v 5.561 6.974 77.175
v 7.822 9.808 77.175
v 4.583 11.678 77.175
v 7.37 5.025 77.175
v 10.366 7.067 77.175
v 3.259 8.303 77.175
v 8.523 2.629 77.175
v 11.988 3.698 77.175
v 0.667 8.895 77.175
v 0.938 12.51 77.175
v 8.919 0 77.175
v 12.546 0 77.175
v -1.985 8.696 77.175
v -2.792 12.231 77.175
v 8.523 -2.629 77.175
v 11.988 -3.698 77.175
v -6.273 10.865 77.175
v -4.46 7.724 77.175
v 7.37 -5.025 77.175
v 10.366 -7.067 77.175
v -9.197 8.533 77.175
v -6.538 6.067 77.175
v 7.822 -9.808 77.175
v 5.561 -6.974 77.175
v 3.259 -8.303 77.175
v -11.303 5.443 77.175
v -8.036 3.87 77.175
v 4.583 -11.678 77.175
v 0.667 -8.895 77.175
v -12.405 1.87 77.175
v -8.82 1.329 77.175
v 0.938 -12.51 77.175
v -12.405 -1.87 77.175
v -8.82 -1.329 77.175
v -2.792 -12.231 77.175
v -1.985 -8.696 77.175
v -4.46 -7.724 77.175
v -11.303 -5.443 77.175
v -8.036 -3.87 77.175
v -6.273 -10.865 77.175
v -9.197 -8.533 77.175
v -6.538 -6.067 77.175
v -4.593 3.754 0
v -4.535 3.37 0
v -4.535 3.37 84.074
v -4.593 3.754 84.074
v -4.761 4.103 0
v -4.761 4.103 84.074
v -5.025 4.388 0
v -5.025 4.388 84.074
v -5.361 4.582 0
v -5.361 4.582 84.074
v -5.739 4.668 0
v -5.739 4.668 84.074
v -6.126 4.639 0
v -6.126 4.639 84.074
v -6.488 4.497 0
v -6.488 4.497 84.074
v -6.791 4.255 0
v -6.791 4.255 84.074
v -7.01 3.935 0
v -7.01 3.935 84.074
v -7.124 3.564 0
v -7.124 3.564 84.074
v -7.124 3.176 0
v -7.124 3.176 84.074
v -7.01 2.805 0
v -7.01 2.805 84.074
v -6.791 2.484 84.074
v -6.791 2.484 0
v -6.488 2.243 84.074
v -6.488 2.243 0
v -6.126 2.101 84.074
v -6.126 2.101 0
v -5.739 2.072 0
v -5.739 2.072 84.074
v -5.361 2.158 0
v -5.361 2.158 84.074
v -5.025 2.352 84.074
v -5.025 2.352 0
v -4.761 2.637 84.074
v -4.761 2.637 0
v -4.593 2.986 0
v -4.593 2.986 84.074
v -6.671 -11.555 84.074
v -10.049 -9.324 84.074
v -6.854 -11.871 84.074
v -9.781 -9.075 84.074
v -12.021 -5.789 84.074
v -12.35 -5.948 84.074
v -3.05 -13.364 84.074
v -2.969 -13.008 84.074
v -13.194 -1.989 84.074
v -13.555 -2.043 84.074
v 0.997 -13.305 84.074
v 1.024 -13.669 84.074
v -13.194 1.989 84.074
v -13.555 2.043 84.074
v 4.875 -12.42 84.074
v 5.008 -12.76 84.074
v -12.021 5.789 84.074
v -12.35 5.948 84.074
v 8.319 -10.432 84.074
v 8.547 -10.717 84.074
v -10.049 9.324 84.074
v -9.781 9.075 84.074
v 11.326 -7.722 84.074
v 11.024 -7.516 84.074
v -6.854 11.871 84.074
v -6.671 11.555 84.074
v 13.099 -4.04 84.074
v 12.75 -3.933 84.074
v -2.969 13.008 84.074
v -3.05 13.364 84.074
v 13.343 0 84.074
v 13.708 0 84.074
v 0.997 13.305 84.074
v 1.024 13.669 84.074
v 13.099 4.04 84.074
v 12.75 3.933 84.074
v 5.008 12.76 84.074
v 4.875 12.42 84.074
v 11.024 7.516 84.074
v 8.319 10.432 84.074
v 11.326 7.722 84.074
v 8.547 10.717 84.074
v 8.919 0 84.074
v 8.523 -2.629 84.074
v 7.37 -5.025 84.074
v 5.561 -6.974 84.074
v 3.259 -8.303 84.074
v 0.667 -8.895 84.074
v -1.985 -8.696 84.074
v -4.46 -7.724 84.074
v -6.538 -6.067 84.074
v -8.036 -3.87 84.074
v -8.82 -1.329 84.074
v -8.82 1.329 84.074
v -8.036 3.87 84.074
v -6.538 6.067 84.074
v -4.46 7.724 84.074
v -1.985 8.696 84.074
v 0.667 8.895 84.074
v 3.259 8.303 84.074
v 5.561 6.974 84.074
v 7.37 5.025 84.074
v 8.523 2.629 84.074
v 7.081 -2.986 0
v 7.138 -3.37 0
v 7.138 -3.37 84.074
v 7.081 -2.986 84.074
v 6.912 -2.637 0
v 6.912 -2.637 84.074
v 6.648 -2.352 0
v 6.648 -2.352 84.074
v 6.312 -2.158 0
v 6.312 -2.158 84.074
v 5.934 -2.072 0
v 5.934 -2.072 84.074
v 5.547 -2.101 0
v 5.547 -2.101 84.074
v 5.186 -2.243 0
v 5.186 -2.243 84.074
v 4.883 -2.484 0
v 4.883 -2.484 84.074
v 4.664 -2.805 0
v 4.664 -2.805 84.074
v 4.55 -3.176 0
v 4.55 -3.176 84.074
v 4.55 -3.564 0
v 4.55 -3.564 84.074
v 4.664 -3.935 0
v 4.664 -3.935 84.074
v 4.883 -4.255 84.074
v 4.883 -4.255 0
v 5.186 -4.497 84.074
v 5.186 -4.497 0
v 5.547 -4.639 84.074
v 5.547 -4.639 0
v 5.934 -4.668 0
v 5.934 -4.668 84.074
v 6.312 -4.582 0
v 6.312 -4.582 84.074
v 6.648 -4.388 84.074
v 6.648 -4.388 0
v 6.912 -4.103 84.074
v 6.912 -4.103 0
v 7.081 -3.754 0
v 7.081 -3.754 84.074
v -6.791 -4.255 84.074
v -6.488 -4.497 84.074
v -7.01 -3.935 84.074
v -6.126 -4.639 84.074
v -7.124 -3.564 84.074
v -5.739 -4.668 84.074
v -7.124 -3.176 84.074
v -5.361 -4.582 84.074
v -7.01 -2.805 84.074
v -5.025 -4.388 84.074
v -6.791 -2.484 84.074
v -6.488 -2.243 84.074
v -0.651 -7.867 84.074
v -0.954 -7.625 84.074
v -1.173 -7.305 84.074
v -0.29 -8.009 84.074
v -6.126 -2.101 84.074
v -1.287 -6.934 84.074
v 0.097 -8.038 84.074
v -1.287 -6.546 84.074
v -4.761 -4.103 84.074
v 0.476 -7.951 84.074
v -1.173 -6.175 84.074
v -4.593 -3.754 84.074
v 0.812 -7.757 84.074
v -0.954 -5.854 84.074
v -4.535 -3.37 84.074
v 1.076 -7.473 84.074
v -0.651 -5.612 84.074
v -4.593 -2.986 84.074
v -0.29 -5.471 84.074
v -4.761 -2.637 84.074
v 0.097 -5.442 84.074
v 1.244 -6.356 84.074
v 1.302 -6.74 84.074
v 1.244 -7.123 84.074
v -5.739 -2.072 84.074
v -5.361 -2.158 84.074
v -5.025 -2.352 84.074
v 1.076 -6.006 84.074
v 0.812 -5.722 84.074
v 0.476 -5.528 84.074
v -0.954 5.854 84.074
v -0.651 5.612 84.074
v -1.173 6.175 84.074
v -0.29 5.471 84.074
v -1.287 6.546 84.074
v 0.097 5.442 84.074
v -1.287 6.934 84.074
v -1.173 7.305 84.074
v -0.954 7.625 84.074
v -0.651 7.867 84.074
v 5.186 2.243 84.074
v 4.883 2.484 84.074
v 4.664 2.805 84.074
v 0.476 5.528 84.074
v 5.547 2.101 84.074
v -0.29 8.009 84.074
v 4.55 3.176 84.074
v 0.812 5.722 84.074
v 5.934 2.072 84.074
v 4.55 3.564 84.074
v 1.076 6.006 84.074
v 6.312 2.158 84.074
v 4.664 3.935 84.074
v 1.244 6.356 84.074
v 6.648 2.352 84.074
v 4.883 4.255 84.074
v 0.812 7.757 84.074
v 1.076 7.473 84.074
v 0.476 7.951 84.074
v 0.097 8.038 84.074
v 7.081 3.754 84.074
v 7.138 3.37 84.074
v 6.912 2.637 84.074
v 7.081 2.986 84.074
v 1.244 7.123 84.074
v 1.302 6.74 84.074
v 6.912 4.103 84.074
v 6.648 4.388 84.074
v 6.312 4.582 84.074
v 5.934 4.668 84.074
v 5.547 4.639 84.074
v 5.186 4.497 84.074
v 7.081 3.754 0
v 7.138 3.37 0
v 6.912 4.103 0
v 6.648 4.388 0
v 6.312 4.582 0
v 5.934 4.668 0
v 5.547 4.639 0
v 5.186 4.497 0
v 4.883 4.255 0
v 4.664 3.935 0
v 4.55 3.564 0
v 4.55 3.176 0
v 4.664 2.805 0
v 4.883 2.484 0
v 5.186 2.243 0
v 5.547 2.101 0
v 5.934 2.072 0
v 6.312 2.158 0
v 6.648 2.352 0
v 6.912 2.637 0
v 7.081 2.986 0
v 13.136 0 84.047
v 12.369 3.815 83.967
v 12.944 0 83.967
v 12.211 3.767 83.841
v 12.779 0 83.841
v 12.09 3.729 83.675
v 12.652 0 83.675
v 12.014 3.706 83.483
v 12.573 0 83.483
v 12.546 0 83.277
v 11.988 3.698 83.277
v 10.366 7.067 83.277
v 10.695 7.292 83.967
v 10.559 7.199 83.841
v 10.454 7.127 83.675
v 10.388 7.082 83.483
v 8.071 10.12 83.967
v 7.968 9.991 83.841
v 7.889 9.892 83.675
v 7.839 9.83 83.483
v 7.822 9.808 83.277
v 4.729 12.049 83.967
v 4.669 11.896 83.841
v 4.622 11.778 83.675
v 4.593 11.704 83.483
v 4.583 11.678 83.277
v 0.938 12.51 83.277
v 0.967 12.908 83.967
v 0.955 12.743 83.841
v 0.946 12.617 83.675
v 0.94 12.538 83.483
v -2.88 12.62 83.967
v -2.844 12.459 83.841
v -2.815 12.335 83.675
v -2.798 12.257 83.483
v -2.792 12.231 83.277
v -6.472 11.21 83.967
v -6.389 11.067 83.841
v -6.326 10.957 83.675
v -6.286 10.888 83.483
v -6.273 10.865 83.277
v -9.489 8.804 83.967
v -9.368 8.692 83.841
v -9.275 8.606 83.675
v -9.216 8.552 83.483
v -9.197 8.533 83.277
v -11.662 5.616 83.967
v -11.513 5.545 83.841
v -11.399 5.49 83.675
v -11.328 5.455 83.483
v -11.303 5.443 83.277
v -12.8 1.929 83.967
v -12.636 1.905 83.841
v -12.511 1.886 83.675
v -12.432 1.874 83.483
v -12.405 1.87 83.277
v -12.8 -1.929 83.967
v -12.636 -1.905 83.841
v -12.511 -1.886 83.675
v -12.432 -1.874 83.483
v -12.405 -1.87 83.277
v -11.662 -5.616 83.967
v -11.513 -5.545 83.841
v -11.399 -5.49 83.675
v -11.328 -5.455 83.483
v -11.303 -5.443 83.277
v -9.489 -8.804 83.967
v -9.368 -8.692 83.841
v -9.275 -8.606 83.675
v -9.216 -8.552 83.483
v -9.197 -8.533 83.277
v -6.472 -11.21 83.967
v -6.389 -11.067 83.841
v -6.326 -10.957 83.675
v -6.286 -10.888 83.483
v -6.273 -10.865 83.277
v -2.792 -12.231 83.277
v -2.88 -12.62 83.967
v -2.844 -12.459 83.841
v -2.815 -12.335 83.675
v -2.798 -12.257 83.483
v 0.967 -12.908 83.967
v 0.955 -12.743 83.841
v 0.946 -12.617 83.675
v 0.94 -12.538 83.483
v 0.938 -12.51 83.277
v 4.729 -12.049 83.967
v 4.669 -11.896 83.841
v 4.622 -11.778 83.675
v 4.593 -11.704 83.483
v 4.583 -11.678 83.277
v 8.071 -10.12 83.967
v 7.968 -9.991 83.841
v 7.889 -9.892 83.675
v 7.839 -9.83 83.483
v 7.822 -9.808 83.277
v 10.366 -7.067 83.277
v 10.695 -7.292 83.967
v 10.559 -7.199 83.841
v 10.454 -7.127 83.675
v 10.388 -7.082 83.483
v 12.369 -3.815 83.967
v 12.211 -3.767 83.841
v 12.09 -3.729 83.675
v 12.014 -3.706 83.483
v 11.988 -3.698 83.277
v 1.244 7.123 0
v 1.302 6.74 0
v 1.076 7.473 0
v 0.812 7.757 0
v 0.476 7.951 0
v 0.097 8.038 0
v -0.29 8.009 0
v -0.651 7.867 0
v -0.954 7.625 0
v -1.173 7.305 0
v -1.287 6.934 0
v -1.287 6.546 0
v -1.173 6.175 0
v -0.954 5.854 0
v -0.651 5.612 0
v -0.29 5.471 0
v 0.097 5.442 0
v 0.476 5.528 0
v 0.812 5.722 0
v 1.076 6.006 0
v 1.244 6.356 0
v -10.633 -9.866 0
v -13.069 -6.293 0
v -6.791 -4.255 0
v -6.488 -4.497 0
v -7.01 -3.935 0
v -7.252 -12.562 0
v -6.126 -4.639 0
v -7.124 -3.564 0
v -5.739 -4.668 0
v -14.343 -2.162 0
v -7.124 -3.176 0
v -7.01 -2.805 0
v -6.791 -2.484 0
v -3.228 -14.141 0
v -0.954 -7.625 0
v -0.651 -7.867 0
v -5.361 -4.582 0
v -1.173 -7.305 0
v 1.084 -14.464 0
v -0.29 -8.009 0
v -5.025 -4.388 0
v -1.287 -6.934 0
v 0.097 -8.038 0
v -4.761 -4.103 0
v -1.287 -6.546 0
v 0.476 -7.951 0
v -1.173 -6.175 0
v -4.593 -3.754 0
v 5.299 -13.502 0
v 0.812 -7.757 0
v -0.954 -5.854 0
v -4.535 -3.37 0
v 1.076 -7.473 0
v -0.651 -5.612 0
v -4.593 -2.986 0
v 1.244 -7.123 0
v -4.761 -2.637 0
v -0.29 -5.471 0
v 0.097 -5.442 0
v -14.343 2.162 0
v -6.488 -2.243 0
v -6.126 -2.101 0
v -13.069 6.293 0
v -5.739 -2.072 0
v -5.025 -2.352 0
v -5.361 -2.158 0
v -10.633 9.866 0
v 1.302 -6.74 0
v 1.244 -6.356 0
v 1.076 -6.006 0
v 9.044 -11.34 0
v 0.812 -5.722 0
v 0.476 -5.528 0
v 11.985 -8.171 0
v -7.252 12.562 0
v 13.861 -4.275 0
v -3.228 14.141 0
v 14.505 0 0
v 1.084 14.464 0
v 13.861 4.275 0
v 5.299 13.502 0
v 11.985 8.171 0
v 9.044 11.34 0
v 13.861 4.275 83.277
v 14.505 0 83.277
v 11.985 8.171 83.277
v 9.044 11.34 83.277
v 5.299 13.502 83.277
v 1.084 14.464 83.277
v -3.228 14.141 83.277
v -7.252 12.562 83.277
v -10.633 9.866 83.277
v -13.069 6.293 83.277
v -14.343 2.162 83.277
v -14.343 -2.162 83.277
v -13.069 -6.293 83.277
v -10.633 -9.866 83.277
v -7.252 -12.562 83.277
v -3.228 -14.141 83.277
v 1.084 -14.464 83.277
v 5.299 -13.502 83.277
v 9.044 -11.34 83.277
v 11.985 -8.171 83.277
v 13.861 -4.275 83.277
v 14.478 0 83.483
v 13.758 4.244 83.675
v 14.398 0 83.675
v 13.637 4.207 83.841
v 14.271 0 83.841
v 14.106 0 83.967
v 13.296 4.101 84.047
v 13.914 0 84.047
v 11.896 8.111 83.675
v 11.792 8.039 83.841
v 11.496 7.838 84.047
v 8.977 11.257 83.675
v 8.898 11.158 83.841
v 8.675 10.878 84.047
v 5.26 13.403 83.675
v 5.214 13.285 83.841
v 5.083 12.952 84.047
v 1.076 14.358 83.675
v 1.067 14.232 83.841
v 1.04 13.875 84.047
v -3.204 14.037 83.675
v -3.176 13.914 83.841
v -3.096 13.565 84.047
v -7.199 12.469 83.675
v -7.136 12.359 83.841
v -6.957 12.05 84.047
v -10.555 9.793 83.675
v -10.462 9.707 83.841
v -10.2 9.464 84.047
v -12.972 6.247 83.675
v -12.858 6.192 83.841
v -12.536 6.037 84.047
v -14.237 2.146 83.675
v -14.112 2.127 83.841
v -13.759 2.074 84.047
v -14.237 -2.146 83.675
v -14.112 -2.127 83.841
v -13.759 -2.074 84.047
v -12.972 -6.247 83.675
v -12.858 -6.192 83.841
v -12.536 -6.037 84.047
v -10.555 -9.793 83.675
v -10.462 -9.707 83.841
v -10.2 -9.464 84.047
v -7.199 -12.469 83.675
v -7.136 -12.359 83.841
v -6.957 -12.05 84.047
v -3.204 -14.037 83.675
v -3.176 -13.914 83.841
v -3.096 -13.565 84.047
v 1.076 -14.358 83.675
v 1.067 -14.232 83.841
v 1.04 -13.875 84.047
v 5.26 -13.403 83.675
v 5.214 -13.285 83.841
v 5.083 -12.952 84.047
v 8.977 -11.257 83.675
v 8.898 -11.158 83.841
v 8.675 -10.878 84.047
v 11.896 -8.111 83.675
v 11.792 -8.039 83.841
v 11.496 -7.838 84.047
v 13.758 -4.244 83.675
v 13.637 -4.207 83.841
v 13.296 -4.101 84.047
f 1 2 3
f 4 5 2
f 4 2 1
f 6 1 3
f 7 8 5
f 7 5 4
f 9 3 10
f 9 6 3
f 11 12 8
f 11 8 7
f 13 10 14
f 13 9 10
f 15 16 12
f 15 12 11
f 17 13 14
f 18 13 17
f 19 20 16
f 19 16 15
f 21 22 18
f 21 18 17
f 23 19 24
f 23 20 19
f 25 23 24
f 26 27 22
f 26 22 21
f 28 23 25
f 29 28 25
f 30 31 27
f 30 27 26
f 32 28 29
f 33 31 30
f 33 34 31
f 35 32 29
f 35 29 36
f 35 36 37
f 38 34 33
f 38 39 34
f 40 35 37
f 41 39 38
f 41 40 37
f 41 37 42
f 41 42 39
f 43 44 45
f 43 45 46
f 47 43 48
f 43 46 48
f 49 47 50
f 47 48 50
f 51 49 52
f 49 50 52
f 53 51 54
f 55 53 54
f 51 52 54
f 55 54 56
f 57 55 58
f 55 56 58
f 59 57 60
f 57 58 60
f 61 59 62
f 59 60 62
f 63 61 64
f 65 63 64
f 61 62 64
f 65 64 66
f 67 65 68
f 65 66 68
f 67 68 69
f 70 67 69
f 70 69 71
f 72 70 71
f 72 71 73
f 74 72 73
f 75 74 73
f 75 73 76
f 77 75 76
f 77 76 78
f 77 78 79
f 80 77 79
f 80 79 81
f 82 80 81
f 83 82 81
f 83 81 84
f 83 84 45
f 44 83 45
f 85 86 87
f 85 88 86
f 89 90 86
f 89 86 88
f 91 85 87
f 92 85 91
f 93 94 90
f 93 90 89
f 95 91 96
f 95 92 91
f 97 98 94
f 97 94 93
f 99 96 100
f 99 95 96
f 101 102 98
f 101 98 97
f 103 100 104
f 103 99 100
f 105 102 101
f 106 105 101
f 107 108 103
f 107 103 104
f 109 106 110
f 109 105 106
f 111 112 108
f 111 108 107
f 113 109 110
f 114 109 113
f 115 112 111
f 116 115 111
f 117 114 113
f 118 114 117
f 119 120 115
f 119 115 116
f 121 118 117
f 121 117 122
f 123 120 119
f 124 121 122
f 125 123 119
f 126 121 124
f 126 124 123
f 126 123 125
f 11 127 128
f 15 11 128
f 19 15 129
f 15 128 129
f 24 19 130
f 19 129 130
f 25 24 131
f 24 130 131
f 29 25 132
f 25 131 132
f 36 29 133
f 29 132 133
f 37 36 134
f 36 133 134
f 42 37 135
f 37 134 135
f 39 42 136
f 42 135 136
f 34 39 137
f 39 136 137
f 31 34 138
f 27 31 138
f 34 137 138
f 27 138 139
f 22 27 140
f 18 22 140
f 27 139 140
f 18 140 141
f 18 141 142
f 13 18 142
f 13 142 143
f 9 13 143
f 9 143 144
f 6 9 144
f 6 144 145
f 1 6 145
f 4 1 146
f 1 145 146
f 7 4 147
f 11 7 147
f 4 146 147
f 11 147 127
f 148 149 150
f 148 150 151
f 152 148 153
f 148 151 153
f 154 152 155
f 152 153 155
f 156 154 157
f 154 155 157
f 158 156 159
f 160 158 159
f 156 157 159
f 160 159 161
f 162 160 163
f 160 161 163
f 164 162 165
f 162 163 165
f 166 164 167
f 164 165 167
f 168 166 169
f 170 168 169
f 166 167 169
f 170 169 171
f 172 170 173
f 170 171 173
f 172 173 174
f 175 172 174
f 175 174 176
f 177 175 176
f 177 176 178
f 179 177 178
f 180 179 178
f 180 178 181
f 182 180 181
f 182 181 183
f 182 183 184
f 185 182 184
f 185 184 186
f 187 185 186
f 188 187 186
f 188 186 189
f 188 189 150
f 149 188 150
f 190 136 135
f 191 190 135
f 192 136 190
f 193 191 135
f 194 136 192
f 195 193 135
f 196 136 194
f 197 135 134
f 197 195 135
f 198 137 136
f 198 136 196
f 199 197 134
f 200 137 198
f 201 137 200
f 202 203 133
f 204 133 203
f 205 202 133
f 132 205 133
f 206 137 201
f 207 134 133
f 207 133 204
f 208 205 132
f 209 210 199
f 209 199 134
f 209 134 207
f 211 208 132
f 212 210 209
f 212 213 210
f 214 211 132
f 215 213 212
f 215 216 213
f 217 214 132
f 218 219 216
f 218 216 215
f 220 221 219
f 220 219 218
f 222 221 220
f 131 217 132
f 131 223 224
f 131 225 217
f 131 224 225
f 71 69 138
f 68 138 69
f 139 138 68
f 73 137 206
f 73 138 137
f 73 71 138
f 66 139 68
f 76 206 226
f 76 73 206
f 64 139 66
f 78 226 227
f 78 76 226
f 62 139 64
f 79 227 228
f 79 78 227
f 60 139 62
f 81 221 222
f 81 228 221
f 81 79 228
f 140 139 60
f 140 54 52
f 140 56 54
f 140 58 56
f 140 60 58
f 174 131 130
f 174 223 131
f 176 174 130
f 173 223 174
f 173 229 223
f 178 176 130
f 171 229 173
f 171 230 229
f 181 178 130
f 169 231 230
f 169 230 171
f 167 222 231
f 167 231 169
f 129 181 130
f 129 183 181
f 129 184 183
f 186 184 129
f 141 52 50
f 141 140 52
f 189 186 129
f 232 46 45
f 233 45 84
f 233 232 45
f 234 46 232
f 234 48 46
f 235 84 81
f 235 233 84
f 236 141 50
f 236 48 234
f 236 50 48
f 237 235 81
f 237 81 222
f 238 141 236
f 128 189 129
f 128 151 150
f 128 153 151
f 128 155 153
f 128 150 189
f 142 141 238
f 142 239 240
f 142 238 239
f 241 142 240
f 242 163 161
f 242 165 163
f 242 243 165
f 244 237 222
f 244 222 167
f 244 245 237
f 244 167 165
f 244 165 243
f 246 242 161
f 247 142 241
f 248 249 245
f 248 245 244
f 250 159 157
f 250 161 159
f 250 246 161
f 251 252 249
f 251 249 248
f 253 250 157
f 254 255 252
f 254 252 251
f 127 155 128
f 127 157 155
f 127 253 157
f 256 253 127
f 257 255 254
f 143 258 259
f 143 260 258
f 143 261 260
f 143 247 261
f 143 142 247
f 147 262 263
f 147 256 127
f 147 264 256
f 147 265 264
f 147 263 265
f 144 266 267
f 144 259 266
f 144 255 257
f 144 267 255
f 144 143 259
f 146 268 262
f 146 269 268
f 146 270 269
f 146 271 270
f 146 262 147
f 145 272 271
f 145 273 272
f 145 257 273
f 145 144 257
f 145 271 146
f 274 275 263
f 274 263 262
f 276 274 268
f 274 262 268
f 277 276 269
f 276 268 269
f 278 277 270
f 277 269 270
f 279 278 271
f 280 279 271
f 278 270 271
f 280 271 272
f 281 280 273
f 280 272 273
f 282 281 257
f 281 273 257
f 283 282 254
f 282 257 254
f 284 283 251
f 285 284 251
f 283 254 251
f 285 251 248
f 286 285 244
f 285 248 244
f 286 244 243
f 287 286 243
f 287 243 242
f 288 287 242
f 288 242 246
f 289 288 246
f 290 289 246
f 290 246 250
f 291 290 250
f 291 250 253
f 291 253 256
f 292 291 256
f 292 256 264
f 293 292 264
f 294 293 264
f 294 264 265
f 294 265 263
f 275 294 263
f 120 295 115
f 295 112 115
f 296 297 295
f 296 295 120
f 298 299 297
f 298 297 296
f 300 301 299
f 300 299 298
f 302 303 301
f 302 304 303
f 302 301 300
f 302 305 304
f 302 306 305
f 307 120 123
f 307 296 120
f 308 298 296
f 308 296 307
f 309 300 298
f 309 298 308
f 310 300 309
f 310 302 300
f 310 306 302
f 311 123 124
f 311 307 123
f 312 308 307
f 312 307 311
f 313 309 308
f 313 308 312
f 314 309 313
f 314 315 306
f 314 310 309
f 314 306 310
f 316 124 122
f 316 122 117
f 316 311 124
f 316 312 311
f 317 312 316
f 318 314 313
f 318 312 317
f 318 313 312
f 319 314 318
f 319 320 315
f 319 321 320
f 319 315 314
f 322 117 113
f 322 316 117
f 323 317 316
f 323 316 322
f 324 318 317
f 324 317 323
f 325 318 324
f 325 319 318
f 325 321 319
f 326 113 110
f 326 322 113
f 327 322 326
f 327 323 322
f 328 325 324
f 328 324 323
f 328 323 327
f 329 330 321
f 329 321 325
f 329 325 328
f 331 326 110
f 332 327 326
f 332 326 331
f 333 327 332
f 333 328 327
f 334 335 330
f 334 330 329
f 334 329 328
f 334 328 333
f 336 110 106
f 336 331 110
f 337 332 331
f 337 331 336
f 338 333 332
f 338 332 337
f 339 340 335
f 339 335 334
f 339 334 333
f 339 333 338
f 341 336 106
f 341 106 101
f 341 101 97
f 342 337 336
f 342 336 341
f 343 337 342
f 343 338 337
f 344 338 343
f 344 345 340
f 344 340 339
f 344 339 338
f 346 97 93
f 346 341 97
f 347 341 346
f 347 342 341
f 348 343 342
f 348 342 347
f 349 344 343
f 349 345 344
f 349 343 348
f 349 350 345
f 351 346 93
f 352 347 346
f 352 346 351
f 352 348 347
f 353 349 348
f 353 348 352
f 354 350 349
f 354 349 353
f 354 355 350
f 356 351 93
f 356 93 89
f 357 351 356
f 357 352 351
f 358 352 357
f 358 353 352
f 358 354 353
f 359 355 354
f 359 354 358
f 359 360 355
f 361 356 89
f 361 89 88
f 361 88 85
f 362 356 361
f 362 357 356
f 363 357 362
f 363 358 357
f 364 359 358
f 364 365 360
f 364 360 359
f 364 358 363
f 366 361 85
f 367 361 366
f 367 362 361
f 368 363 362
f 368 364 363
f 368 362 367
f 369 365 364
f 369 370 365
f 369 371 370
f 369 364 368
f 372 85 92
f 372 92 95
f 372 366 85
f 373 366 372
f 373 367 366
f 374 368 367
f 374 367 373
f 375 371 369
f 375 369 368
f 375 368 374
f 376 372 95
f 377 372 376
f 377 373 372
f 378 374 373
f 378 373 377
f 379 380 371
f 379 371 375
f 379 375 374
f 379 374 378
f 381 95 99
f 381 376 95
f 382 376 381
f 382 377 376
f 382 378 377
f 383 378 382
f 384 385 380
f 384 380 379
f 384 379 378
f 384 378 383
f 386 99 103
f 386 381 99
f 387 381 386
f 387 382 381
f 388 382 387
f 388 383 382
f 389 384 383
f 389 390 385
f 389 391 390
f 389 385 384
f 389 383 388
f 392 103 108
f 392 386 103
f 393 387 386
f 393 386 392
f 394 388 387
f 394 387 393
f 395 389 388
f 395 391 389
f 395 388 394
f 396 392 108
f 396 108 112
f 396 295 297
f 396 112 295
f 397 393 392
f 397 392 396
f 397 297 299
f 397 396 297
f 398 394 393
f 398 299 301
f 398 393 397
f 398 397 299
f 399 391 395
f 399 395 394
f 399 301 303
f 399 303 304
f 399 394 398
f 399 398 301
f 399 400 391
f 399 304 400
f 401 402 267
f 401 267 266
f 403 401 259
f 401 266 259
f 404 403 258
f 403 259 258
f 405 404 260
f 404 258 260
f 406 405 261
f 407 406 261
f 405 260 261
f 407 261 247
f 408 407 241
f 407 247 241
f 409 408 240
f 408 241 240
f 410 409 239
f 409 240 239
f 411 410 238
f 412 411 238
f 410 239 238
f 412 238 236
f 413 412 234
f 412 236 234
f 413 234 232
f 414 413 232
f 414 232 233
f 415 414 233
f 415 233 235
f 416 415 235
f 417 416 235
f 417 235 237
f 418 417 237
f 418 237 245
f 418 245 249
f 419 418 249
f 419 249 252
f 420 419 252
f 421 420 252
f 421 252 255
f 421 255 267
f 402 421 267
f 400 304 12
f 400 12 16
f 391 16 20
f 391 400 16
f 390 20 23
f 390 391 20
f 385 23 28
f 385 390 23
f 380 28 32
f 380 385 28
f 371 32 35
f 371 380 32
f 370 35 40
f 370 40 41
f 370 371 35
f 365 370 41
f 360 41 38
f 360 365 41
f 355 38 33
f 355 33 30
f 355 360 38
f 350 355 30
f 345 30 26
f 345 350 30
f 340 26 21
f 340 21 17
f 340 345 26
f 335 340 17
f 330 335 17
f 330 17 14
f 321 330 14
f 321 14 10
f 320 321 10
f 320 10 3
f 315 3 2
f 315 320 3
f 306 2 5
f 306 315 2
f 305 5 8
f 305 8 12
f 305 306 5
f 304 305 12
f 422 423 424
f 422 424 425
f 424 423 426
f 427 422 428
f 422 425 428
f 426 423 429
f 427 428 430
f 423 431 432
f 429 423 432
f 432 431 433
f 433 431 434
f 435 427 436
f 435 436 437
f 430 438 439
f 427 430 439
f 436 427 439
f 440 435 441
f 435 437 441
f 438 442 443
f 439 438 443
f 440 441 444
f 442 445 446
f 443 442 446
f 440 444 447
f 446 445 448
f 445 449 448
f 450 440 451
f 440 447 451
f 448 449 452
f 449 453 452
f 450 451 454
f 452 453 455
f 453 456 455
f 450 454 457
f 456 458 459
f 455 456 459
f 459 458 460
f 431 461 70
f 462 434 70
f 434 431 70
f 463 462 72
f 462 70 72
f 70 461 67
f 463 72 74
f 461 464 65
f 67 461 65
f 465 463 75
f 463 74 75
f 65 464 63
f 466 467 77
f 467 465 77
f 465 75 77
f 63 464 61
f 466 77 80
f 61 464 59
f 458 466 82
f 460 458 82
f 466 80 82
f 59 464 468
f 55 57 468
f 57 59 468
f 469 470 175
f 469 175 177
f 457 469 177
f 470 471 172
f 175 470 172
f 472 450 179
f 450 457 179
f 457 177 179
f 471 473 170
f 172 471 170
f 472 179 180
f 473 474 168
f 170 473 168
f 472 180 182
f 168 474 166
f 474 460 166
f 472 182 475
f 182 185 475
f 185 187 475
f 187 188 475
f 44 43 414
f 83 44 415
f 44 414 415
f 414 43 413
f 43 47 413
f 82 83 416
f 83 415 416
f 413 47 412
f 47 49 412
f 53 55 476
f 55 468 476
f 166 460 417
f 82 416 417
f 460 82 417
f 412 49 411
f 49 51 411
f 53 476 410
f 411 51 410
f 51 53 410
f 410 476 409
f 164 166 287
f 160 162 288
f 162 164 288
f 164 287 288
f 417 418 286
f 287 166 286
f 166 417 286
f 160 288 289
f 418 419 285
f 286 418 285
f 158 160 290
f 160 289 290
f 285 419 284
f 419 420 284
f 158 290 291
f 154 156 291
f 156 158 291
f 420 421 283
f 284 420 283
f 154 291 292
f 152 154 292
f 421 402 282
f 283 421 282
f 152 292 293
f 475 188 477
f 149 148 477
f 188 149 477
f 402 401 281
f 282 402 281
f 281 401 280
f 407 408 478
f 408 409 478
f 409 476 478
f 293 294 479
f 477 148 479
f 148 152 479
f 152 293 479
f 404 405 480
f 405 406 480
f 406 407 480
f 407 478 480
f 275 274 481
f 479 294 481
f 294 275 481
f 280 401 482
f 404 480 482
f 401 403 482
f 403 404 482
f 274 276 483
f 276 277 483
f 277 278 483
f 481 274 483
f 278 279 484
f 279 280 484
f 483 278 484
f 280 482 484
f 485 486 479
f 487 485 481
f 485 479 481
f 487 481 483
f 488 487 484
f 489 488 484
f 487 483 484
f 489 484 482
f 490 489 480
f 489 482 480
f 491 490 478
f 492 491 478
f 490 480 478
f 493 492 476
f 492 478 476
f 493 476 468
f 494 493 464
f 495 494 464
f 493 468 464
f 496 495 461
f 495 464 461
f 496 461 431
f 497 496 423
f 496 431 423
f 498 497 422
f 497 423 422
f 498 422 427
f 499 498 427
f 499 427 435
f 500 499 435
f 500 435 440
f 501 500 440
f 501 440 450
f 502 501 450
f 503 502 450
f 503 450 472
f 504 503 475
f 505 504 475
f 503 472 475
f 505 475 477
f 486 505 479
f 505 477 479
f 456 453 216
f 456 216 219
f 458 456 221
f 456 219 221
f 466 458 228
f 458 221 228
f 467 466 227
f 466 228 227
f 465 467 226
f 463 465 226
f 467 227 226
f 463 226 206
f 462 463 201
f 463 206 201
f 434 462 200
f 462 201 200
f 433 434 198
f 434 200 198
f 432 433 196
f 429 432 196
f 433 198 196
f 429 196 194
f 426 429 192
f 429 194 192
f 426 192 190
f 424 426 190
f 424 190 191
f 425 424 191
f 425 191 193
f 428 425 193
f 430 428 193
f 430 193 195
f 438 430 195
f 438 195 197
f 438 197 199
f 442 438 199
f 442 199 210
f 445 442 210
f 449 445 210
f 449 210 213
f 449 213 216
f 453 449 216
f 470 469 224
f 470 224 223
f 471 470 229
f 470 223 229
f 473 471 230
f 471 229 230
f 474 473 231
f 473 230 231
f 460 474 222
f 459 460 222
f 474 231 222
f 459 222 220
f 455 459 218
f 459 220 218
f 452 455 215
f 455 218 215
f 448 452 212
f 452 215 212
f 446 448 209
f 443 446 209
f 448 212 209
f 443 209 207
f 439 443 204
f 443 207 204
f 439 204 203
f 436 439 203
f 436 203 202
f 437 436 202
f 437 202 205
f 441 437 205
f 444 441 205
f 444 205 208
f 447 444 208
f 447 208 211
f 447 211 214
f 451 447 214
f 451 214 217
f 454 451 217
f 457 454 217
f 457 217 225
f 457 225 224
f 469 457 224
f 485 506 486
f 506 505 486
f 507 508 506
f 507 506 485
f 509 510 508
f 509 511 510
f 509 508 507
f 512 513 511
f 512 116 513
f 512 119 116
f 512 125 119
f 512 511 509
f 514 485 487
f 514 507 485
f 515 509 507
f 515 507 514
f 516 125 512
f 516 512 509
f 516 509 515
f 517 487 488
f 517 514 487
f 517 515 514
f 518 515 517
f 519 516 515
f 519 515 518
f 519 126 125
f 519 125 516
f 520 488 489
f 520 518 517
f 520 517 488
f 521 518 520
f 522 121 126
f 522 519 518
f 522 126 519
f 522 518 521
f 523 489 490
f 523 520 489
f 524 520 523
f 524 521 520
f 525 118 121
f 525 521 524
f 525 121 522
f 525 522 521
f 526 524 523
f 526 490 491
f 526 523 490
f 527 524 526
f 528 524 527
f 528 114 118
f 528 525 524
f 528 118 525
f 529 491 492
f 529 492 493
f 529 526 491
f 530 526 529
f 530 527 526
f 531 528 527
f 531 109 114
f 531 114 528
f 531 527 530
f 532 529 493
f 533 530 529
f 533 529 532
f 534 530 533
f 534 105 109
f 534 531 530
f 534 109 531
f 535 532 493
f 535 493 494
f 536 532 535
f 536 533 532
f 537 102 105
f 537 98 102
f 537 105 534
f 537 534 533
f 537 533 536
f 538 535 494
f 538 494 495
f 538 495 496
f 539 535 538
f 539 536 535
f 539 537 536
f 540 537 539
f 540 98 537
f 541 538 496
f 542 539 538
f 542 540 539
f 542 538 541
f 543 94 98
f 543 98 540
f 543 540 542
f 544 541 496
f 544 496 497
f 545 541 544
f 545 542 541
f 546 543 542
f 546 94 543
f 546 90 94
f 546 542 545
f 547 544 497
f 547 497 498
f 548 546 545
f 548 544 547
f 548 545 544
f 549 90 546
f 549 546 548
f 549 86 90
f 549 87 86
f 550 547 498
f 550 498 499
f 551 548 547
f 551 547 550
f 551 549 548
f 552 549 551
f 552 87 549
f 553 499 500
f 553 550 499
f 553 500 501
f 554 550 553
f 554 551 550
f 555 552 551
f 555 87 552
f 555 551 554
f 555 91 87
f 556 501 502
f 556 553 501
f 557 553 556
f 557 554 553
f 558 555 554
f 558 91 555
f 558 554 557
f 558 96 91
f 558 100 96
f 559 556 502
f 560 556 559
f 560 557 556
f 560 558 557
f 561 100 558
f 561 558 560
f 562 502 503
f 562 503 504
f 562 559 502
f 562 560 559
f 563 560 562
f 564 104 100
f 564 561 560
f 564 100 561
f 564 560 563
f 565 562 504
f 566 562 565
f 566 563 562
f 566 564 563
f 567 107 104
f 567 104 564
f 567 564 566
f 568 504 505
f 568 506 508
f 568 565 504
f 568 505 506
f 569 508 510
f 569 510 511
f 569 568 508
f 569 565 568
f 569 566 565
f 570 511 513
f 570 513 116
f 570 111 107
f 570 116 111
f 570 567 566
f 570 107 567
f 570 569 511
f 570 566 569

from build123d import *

# Parameters (mm, degrees)
F0_R     = 14.5049581744
F1_DEPTH = 84.074
F2_R     = 1.301702719
F3_DEPTH = 84.075
F4_W     = 3.6260485649
F4_H     = 8.158609271
F6_R     = 0.7971733183


with BuildPart() as f1:
    # F0 (on Top) → F1 (new body)
    with BuildSketch(Plane.XY):
        Circle(F0_R)
    extrude(amount=F1_DEPTH)

    # F2 (on face) → F3 (cut, through all)
    with BuildSketch(Plane.XY.offset(84.074)):
        with Locations((0, 6.7397234961)):
            Circle(F2_R)
        with Locations((5.8367717621, 3.3698617481)):
            Circle(F2_R)
        with Locations((5.8367717621, -3.3698617481)):
            Circle(F2_R)
        with Locations((0, -6.7397234961)):
            Circle(F2_R)
        with Locations((-5.8367717621, -3.3698617481)):
            Circle(F2_R)
        with Locations((-5.8367717621, 3.3698617481)):
            Circle(F2_R)
    extrude(amount=-F3_DEPTH, mode=Mode.SUBTRACT)

    # F4 (on Front) → F5 (revolve, cut)
    with BuildSketch(Plane.XZ):
        with Locations((10.7324868441, 81.2547430396)):
            Rectangle(F4_W, F4_H)
    revolve(axis=Axis((0, 0, 0), (0, 0, -1)), mode=Mode.SUBTRACT)

    # F6
    f6_edges = [f1.edges().sort_by_distance(p)[0] for p in [
        (-14.504958, 0, 84.074),
        (-12.545511, 0, 84.074),
    ]]
    fillet(f6_edges, radius=F6_R)


solid = f1.part
